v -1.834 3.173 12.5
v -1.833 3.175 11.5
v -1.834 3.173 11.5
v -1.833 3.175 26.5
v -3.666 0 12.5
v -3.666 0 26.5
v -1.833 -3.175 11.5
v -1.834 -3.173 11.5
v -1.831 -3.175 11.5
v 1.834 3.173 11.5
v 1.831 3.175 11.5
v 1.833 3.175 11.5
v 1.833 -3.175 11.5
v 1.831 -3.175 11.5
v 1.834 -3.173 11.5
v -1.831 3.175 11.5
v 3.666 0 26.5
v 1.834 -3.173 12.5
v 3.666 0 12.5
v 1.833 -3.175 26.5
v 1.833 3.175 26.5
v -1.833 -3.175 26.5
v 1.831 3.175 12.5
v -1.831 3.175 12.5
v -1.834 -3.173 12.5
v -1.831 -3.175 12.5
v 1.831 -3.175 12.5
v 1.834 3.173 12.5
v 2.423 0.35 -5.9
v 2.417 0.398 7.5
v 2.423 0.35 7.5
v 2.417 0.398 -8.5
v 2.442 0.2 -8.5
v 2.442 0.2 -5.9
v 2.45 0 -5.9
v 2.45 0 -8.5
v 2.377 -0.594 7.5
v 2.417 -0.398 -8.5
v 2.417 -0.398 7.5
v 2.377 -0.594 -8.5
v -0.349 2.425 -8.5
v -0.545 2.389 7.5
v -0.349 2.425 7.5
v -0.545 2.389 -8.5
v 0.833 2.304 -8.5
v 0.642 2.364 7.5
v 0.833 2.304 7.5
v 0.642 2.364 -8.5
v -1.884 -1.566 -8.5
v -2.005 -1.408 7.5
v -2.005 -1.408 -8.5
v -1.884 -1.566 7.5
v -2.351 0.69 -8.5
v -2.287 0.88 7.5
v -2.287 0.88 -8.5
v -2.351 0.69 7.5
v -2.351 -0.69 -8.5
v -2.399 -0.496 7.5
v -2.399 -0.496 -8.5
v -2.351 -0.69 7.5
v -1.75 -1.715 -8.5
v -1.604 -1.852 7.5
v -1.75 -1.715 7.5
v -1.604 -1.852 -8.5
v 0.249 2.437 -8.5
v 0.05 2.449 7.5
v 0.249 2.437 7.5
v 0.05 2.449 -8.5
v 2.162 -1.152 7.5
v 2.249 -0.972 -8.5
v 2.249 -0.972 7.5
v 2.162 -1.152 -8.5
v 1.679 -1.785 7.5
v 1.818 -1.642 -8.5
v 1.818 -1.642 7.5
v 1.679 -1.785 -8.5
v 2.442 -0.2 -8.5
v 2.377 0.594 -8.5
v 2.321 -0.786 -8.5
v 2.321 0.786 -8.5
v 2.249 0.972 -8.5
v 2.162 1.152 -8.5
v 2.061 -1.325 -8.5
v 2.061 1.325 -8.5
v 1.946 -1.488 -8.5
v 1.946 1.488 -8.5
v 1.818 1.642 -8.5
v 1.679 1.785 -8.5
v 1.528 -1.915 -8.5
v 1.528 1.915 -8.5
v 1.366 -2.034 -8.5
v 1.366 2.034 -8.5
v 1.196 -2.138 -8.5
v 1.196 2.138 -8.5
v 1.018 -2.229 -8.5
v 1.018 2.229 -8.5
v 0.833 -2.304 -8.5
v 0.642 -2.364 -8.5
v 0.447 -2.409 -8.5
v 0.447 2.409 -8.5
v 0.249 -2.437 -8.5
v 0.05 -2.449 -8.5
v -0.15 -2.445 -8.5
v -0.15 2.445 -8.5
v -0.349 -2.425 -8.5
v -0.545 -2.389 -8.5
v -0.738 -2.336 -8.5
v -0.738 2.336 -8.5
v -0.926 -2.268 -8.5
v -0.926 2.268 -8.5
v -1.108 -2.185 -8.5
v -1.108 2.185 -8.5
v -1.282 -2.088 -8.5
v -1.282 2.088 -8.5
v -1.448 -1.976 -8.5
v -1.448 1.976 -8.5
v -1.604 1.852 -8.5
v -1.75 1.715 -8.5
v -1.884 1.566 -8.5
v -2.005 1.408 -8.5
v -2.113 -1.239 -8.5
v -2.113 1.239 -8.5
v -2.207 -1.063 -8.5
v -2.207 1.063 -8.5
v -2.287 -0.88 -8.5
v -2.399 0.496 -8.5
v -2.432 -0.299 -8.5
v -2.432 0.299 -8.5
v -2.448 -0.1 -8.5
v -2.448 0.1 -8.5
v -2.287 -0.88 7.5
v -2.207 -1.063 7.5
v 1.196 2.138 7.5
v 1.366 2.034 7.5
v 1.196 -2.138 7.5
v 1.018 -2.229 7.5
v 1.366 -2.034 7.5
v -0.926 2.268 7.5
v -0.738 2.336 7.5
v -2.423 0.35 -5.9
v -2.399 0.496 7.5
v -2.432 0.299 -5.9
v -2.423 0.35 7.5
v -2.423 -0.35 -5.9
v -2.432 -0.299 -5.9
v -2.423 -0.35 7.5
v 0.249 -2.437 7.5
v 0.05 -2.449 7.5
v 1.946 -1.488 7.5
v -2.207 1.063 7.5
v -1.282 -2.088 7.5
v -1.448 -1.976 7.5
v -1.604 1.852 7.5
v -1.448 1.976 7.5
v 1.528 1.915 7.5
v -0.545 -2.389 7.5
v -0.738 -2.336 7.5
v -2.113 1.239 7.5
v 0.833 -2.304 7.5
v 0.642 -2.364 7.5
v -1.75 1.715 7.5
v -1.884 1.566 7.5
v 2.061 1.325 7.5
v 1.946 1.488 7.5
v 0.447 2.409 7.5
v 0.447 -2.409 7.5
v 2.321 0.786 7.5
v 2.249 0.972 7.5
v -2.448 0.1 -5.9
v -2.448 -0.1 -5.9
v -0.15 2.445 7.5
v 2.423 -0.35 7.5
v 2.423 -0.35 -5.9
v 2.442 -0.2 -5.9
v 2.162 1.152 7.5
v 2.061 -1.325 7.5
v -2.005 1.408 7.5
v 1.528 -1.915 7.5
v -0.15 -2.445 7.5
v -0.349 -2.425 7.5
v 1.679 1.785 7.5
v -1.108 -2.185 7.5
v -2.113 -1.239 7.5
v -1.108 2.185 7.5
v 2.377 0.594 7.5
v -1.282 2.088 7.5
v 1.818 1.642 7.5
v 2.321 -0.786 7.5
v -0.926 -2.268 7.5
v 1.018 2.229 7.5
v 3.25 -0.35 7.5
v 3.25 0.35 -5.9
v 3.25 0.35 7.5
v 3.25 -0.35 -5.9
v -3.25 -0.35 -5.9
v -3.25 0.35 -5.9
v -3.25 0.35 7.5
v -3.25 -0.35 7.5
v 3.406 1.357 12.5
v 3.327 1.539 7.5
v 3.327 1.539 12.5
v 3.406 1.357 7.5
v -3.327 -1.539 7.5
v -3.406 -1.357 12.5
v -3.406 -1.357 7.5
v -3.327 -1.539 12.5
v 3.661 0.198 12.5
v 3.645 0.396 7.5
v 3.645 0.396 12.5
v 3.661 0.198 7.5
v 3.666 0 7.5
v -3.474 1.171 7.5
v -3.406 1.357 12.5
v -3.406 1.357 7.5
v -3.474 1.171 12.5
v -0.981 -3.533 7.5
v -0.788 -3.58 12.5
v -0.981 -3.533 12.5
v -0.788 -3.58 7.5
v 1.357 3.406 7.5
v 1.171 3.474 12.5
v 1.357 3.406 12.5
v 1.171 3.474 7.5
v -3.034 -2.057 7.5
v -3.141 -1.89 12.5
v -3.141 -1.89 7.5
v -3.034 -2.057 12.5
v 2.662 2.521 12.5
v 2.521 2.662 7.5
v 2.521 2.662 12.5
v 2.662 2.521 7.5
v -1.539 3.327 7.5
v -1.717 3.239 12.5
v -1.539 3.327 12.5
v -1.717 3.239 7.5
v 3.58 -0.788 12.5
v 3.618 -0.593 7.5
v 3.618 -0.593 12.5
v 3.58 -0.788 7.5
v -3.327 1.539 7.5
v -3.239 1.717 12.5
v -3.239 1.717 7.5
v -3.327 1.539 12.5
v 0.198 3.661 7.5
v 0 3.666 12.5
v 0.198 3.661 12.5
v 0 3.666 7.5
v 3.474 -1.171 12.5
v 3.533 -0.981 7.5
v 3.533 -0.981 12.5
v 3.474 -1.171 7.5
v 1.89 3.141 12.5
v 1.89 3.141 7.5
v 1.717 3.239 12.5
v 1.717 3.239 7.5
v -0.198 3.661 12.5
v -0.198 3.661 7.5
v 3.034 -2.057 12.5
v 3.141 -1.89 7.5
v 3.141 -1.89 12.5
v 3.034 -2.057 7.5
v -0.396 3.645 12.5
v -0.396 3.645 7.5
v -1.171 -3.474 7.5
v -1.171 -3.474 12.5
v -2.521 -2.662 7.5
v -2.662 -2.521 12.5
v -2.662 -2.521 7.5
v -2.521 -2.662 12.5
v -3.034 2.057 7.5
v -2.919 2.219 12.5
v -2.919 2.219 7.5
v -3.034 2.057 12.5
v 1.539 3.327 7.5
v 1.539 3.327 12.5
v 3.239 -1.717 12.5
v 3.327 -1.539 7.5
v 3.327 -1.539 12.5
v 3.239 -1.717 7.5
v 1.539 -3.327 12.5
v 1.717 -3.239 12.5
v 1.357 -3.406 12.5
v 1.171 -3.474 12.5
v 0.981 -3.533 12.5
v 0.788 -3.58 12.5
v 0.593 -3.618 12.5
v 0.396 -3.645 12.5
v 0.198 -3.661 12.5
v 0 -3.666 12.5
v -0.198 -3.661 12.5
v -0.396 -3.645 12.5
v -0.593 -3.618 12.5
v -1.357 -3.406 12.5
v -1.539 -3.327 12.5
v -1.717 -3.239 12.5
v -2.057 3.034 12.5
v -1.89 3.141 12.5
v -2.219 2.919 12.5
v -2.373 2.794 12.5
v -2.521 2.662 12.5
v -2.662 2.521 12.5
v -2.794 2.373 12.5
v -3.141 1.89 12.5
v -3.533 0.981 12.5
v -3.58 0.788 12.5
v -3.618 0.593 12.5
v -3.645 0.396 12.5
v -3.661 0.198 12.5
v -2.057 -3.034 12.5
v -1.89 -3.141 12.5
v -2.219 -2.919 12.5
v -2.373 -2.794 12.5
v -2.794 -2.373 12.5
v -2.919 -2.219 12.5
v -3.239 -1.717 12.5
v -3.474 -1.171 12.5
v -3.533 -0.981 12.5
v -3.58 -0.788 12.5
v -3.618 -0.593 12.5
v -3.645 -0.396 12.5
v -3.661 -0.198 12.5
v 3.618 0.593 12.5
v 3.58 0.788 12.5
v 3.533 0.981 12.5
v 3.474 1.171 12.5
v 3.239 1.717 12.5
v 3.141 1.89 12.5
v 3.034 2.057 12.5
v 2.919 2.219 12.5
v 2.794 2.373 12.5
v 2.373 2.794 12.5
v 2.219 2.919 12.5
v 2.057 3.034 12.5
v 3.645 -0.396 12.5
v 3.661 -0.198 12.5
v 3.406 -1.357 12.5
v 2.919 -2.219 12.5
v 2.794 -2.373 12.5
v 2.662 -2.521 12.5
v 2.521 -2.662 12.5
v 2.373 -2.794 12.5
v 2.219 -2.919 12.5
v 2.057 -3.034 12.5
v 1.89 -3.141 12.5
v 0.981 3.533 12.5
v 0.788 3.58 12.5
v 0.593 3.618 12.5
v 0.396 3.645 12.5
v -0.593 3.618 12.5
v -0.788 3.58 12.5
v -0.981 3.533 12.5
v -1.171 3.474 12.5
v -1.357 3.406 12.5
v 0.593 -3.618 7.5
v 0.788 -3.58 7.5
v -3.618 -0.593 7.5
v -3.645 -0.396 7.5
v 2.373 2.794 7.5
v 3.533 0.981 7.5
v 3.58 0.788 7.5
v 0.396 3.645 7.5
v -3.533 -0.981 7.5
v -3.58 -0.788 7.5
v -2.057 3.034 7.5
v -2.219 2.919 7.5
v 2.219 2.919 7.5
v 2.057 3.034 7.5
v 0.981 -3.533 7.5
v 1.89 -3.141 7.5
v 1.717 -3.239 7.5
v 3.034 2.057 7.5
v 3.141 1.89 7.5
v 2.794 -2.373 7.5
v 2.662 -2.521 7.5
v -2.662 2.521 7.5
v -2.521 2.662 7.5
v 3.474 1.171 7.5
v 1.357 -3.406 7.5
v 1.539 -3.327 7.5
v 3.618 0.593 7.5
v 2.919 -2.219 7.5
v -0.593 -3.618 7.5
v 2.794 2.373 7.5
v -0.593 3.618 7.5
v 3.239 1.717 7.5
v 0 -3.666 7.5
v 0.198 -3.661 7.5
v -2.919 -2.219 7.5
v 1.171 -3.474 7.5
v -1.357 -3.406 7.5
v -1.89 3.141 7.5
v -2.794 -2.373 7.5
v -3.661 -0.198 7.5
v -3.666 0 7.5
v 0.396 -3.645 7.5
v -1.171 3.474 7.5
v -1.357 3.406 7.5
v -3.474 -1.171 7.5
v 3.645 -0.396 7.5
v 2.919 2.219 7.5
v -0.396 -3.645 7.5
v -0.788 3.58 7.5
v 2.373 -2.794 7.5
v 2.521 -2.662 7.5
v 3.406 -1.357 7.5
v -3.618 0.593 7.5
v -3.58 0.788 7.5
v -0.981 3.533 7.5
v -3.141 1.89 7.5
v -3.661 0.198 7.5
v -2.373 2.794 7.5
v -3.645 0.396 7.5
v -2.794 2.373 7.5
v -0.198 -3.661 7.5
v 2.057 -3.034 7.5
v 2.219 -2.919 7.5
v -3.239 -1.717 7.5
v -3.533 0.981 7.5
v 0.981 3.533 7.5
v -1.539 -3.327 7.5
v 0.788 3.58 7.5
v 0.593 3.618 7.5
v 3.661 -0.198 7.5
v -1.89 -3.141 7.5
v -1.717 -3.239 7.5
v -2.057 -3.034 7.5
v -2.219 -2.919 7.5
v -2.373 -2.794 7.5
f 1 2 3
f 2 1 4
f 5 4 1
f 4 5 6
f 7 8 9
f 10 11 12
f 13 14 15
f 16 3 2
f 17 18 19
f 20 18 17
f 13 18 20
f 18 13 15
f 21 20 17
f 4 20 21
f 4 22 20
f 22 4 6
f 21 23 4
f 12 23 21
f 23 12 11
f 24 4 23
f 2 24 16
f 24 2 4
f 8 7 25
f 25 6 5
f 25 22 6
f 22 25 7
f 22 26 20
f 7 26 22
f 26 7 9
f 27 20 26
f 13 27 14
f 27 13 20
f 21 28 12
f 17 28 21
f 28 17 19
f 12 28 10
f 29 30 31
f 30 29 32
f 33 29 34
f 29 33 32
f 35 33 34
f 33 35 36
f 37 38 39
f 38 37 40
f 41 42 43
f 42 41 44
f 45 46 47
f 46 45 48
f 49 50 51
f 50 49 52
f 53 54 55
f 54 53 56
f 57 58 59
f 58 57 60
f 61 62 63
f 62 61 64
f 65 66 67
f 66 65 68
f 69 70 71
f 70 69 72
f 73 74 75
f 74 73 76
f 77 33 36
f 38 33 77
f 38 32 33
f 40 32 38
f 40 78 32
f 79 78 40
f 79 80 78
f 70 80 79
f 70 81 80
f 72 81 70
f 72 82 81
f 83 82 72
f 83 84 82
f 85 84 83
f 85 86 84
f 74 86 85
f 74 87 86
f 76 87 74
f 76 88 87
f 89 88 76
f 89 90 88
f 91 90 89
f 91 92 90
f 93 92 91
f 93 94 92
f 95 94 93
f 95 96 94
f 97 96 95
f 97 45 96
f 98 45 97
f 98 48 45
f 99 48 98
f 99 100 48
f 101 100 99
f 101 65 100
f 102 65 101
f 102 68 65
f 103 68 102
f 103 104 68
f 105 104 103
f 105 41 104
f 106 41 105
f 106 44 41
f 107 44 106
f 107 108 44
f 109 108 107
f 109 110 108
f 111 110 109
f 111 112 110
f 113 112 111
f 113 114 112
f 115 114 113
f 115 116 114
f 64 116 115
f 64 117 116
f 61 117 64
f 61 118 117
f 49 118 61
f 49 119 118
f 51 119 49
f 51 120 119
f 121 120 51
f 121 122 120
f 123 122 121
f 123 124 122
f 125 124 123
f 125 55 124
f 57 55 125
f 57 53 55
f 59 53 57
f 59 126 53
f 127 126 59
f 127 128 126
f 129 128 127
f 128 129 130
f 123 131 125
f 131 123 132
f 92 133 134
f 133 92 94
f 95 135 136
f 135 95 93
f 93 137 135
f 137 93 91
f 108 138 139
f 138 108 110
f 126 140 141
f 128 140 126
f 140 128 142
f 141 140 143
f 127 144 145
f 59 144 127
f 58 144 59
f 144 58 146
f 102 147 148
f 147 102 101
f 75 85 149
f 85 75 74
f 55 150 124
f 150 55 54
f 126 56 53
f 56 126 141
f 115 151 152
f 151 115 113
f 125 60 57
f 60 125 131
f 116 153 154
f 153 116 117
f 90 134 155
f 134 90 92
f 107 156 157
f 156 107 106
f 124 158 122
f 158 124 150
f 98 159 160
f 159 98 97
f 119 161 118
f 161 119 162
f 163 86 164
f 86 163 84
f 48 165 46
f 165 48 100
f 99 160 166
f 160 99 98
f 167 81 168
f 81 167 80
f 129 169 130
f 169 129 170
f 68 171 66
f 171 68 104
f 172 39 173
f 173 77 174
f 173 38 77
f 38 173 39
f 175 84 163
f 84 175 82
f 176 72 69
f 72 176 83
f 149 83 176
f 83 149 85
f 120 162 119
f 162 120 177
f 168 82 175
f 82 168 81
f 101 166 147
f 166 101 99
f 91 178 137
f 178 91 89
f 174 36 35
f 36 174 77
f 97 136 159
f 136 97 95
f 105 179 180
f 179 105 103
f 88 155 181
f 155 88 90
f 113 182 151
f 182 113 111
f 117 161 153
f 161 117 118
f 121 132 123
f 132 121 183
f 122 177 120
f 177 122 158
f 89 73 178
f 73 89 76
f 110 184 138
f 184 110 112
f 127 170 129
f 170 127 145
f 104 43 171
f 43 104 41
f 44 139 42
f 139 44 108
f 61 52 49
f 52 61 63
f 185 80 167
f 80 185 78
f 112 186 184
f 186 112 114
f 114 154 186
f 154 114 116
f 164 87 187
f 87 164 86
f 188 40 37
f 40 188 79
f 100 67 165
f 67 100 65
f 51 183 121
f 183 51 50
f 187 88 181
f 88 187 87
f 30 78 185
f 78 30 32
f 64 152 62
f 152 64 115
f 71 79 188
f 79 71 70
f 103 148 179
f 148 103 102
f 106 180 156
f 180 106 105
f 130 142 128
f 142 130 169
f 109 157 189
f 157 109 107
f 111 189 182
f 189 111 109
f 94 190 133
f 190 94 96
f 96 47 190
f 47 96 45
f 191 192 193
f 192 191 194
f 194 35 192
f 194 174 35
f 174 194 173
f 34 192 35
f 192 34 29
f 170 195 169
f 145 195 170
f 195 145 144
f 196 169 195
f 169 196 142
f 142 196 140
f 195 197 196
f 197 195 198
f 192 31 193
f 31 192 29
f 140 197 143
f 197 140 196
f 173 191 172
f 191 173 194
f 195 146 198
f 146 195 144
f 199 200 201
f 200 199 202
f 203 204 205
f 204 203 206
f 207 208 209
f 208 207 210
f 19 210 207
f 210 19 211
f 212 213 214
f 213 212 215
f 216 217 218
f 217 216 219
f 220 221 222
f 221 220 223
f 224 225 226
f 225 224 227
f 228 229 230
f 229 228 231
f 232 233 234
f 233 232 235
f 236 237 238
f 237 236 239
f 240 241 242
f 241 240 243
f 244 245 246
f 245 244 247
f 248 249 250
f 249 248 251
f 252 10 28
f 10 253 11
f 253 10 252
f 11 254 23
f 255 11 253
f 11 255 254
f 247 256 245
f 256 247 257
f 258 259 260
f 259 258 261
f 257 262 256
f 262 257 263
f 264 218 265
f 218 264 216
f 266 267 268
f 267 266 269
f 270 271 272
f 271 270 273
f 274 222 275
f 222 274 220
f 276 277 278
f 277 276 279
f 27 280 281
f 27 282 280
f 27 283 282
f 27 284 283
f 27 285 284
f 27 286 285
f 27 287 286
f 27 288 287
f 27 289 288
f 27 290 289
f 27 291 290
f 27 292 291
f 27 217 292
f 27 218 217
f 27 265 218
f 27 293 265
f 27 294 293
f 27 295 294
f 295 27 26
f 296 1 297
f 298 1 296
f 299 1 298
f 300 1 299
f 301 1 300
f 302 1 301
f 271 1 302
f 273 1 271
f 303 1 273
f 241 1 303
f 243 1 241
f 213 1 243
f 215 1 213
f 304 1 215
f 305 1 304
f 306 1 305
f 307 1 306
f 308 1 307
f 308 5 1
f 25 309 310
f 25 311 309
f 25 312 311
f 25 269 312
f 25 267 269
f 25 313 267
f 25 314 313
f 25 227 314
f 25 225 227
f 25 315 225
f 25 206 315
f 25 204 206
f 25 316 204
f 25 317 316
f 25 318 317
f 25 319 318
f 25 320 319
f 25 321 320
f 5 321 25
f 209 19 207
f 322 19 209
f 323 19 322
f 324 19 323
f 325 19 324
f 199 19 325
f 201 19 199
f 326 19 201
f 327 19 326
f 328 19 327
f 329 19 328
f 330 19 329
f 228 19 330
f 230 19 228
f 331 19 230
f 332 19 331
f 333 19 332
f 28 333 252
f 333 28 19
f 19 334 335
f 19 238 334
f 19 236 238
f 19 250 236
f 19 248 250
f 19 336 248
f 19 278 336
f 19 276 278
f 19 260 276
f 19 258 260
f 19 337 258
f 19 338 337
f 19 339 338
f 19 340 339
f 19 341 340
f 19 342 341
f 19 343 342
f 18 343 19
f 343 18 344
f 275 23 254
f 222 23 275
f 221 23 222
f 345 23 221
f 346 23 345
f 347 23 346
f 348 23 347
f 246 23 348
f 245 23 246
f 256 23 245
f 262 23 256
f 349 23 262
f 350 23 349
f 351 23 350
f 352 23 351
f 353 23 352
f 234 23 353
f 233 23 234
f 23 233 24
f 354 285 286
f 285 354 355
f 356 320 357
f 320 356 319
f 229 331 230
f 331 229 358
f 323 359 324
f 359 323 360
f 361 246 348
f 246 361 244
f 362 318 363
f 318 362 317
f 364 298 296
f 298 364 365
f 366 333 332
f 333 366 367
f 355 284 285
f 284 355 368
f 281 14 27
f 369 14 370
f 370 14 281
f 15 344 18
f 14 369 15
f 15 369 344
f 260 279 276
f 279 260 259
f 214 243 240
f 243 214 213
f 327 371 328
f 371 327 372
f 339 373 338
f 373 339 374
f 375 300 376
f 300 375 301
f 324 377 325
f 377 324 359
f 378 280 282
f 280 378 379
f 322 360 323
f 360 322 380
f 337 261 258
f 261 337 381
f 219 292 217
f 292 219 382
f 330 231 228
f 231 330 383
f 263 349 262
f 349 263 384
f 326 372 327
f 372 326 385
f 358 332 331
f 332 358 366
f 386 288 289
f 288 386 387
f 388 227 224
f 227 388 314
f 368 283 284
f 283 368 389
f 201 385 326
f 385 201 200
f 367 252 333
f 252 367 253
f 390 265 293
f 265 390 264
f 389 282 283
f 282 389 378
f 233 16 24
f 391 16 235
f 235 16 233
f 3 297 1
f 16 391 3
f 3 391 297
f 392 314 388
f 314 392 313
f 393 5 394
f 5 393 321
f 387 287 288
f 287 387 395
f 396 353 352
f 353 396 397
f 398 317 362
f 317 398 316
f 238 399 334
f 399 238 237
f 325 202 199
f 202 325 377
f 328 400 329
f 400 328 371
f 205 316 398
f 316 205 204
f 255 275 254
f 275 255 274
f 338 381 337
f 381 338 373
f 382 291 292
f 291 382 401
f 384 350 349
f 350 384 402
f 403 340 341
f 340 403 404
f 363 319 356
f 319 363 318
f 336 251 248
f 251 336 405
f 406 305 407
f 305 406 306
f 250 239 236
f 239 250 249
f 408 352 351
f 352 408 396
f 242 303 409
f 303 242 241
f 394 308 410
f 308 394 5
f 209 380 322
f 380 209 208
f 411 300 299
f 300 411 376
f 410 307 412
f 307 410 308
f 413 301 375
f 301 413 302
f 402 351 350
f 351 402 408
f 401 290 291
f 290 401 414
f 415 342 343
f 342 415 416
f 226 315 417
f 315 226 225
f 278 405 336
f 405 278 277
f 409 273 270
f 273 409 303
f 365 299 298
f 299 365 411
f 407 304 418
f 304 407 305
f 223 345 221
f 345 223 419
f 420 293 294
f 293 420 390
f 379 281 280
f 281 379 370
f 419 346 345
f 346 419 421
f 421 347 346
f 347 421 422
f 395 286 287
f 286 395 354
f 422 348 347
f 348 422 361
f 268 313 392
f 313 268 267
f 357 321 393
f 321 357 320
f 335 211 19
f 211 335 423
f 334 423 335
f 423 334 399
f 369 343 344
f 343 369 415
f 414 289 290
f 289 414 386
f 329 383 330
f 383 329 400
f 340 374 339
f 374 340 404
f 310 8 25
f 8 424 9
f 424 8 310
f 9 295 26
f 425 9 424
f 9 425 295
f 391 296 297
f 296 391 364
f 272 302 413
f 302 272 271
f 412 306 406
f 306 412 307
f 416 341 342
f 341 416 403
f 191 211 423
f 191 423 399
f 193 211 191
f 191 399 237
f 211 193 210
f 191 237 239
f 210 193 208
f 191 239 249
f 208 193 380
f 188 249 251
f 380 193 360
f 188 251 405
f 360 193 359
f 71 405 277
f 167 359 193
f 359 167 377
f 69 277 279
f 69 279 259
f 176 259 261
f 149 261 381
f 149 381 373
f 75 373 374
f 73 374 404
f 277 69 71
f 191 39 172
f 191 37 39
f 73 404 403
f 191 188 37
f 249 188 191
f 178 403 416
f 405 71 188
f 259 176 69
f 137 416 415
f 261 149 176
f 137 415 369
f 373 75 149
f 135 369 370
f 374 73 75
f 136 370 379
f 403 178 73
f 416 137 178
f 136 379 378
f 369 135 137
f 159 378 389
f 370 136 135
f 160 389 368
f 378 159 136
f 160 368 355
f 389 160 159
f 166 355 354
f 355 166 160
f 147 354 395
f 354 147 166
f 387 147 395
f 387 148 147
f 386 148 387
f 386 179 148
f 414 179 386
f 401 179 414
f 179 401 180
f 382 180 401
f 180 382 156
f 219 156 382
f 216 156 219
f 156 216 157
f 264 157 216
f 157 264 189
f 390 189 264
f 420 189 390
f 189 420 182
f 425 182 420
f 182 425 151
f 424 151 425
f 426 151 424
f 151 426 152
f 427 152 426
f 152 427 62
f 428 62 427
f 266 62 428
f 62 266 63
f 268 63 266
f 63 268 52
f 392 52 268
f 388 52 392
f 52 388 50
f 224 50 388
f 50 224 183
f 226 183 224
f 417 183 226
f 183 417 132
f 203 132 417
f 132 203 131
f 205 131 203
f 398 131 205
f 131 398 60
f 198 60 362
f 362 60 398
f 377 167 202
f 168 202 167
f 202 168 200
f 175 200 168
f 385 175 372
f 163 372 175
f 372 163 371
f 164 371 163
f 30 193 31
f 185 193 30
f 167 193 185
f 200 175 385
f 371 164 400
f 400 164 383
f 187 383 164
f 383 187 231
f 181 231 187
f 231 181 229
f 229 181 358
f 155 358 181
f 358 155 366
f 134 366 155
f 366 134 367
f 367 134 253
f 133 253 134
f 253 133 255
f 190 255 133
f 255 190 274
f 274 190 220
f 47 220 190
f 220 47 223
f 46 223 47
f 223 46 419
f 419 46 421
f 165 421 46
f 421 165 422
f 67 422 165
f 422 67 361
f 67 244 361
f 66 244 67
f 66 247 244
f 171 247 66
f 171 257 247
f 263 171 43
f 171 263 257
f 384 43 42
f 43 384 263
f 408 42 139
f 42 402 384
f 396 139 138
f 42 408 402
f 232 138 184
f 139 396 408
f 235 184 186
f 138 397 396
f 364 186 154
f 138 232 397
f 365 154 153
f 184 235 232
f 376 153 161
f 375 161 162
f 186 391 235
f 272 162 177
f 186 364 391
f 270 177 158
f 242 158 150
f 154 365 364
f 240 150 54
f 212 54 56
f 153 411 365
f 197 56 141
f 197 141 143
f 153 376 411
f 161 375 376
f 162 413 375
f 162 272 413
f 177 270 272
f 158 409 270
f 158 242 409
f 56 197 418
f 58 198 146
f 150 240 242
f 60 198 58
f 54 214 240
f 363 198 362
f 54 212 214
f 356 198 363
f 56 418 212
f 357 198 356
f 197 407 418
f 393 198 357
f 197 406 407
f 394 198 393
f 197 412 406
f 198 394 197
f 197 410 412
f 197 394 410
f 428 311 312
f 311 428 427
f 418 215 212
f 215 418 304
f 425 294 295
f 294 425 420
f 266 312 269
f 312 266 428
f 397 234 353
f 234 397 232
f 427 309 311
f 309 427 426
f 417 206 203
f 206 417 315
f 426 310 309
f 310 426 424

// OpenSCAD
use <MCAD/regular_shapes.scad>

$fs=0.2; //minimum is 0.01
$fa=0.2;
D= 31; // Inner Diameter of Ring Magnet
RMda = 85;
RMthick = 11;
di= 5; // Diameter of core
skin= 0.8; //minimum material thickness
l= 15; //overall height of coil
do=D*(sqrt(2)-1); //calculate maximum outer coil diameter
h=(do-di-2*skin)/2; //calculate remaining height for windings
rhex=(25.4/8)/cos(30); //radius of a 1/4" bit, for the flat side

echo(do,h);

//Melexis Rotary IC SO-8
*translate([0,0,l]) cube([6.4,4.9,1.1],true);

//Ring Magnet
*translate ([0,0,RMthick/2]) difference(){
    cylinder(d=RMda,h=RMthick,center=true);
    cylinder(d=D,h=RMthick+0.1,center=true);
}

// Four Coils
*translate([0,0,l/2]){
    translate([do/2,do/2,0]) Coil();
    translate([-do/2,do/2,0]) Coil();
    translate([do/2,-do/2,0]) Coil();
    translate([-do/2,-do/2,0]) Coil();
}

// One Coil
*Coil();
module Coil()
{
difference(){
    cylinder(h=l, d=do, center=true);
    cylinder(h=l+1, d=di, center=true);
    cube([di+2*skin+0.1,skin,l+0.1],true);
    difference(){
        cylinder(h=(l-2*skin), d=do+1, center=true);
        cylinder(h=l, d=di+2*skin, center=true);
    }
}
}
// Tool
union(){
    translate([0,0,l/2+4])hexagon_prism(15,rhex);
  
    cylinder(h=l+2,d=di-0.1,center=true);
    translate([0,0,2*skin])cube([di+2*skin-0.1,skin-0.1,l],true);
    
    translate([0,0,l/2]) cylinder(h=5,r=rhex);
    
    
}
